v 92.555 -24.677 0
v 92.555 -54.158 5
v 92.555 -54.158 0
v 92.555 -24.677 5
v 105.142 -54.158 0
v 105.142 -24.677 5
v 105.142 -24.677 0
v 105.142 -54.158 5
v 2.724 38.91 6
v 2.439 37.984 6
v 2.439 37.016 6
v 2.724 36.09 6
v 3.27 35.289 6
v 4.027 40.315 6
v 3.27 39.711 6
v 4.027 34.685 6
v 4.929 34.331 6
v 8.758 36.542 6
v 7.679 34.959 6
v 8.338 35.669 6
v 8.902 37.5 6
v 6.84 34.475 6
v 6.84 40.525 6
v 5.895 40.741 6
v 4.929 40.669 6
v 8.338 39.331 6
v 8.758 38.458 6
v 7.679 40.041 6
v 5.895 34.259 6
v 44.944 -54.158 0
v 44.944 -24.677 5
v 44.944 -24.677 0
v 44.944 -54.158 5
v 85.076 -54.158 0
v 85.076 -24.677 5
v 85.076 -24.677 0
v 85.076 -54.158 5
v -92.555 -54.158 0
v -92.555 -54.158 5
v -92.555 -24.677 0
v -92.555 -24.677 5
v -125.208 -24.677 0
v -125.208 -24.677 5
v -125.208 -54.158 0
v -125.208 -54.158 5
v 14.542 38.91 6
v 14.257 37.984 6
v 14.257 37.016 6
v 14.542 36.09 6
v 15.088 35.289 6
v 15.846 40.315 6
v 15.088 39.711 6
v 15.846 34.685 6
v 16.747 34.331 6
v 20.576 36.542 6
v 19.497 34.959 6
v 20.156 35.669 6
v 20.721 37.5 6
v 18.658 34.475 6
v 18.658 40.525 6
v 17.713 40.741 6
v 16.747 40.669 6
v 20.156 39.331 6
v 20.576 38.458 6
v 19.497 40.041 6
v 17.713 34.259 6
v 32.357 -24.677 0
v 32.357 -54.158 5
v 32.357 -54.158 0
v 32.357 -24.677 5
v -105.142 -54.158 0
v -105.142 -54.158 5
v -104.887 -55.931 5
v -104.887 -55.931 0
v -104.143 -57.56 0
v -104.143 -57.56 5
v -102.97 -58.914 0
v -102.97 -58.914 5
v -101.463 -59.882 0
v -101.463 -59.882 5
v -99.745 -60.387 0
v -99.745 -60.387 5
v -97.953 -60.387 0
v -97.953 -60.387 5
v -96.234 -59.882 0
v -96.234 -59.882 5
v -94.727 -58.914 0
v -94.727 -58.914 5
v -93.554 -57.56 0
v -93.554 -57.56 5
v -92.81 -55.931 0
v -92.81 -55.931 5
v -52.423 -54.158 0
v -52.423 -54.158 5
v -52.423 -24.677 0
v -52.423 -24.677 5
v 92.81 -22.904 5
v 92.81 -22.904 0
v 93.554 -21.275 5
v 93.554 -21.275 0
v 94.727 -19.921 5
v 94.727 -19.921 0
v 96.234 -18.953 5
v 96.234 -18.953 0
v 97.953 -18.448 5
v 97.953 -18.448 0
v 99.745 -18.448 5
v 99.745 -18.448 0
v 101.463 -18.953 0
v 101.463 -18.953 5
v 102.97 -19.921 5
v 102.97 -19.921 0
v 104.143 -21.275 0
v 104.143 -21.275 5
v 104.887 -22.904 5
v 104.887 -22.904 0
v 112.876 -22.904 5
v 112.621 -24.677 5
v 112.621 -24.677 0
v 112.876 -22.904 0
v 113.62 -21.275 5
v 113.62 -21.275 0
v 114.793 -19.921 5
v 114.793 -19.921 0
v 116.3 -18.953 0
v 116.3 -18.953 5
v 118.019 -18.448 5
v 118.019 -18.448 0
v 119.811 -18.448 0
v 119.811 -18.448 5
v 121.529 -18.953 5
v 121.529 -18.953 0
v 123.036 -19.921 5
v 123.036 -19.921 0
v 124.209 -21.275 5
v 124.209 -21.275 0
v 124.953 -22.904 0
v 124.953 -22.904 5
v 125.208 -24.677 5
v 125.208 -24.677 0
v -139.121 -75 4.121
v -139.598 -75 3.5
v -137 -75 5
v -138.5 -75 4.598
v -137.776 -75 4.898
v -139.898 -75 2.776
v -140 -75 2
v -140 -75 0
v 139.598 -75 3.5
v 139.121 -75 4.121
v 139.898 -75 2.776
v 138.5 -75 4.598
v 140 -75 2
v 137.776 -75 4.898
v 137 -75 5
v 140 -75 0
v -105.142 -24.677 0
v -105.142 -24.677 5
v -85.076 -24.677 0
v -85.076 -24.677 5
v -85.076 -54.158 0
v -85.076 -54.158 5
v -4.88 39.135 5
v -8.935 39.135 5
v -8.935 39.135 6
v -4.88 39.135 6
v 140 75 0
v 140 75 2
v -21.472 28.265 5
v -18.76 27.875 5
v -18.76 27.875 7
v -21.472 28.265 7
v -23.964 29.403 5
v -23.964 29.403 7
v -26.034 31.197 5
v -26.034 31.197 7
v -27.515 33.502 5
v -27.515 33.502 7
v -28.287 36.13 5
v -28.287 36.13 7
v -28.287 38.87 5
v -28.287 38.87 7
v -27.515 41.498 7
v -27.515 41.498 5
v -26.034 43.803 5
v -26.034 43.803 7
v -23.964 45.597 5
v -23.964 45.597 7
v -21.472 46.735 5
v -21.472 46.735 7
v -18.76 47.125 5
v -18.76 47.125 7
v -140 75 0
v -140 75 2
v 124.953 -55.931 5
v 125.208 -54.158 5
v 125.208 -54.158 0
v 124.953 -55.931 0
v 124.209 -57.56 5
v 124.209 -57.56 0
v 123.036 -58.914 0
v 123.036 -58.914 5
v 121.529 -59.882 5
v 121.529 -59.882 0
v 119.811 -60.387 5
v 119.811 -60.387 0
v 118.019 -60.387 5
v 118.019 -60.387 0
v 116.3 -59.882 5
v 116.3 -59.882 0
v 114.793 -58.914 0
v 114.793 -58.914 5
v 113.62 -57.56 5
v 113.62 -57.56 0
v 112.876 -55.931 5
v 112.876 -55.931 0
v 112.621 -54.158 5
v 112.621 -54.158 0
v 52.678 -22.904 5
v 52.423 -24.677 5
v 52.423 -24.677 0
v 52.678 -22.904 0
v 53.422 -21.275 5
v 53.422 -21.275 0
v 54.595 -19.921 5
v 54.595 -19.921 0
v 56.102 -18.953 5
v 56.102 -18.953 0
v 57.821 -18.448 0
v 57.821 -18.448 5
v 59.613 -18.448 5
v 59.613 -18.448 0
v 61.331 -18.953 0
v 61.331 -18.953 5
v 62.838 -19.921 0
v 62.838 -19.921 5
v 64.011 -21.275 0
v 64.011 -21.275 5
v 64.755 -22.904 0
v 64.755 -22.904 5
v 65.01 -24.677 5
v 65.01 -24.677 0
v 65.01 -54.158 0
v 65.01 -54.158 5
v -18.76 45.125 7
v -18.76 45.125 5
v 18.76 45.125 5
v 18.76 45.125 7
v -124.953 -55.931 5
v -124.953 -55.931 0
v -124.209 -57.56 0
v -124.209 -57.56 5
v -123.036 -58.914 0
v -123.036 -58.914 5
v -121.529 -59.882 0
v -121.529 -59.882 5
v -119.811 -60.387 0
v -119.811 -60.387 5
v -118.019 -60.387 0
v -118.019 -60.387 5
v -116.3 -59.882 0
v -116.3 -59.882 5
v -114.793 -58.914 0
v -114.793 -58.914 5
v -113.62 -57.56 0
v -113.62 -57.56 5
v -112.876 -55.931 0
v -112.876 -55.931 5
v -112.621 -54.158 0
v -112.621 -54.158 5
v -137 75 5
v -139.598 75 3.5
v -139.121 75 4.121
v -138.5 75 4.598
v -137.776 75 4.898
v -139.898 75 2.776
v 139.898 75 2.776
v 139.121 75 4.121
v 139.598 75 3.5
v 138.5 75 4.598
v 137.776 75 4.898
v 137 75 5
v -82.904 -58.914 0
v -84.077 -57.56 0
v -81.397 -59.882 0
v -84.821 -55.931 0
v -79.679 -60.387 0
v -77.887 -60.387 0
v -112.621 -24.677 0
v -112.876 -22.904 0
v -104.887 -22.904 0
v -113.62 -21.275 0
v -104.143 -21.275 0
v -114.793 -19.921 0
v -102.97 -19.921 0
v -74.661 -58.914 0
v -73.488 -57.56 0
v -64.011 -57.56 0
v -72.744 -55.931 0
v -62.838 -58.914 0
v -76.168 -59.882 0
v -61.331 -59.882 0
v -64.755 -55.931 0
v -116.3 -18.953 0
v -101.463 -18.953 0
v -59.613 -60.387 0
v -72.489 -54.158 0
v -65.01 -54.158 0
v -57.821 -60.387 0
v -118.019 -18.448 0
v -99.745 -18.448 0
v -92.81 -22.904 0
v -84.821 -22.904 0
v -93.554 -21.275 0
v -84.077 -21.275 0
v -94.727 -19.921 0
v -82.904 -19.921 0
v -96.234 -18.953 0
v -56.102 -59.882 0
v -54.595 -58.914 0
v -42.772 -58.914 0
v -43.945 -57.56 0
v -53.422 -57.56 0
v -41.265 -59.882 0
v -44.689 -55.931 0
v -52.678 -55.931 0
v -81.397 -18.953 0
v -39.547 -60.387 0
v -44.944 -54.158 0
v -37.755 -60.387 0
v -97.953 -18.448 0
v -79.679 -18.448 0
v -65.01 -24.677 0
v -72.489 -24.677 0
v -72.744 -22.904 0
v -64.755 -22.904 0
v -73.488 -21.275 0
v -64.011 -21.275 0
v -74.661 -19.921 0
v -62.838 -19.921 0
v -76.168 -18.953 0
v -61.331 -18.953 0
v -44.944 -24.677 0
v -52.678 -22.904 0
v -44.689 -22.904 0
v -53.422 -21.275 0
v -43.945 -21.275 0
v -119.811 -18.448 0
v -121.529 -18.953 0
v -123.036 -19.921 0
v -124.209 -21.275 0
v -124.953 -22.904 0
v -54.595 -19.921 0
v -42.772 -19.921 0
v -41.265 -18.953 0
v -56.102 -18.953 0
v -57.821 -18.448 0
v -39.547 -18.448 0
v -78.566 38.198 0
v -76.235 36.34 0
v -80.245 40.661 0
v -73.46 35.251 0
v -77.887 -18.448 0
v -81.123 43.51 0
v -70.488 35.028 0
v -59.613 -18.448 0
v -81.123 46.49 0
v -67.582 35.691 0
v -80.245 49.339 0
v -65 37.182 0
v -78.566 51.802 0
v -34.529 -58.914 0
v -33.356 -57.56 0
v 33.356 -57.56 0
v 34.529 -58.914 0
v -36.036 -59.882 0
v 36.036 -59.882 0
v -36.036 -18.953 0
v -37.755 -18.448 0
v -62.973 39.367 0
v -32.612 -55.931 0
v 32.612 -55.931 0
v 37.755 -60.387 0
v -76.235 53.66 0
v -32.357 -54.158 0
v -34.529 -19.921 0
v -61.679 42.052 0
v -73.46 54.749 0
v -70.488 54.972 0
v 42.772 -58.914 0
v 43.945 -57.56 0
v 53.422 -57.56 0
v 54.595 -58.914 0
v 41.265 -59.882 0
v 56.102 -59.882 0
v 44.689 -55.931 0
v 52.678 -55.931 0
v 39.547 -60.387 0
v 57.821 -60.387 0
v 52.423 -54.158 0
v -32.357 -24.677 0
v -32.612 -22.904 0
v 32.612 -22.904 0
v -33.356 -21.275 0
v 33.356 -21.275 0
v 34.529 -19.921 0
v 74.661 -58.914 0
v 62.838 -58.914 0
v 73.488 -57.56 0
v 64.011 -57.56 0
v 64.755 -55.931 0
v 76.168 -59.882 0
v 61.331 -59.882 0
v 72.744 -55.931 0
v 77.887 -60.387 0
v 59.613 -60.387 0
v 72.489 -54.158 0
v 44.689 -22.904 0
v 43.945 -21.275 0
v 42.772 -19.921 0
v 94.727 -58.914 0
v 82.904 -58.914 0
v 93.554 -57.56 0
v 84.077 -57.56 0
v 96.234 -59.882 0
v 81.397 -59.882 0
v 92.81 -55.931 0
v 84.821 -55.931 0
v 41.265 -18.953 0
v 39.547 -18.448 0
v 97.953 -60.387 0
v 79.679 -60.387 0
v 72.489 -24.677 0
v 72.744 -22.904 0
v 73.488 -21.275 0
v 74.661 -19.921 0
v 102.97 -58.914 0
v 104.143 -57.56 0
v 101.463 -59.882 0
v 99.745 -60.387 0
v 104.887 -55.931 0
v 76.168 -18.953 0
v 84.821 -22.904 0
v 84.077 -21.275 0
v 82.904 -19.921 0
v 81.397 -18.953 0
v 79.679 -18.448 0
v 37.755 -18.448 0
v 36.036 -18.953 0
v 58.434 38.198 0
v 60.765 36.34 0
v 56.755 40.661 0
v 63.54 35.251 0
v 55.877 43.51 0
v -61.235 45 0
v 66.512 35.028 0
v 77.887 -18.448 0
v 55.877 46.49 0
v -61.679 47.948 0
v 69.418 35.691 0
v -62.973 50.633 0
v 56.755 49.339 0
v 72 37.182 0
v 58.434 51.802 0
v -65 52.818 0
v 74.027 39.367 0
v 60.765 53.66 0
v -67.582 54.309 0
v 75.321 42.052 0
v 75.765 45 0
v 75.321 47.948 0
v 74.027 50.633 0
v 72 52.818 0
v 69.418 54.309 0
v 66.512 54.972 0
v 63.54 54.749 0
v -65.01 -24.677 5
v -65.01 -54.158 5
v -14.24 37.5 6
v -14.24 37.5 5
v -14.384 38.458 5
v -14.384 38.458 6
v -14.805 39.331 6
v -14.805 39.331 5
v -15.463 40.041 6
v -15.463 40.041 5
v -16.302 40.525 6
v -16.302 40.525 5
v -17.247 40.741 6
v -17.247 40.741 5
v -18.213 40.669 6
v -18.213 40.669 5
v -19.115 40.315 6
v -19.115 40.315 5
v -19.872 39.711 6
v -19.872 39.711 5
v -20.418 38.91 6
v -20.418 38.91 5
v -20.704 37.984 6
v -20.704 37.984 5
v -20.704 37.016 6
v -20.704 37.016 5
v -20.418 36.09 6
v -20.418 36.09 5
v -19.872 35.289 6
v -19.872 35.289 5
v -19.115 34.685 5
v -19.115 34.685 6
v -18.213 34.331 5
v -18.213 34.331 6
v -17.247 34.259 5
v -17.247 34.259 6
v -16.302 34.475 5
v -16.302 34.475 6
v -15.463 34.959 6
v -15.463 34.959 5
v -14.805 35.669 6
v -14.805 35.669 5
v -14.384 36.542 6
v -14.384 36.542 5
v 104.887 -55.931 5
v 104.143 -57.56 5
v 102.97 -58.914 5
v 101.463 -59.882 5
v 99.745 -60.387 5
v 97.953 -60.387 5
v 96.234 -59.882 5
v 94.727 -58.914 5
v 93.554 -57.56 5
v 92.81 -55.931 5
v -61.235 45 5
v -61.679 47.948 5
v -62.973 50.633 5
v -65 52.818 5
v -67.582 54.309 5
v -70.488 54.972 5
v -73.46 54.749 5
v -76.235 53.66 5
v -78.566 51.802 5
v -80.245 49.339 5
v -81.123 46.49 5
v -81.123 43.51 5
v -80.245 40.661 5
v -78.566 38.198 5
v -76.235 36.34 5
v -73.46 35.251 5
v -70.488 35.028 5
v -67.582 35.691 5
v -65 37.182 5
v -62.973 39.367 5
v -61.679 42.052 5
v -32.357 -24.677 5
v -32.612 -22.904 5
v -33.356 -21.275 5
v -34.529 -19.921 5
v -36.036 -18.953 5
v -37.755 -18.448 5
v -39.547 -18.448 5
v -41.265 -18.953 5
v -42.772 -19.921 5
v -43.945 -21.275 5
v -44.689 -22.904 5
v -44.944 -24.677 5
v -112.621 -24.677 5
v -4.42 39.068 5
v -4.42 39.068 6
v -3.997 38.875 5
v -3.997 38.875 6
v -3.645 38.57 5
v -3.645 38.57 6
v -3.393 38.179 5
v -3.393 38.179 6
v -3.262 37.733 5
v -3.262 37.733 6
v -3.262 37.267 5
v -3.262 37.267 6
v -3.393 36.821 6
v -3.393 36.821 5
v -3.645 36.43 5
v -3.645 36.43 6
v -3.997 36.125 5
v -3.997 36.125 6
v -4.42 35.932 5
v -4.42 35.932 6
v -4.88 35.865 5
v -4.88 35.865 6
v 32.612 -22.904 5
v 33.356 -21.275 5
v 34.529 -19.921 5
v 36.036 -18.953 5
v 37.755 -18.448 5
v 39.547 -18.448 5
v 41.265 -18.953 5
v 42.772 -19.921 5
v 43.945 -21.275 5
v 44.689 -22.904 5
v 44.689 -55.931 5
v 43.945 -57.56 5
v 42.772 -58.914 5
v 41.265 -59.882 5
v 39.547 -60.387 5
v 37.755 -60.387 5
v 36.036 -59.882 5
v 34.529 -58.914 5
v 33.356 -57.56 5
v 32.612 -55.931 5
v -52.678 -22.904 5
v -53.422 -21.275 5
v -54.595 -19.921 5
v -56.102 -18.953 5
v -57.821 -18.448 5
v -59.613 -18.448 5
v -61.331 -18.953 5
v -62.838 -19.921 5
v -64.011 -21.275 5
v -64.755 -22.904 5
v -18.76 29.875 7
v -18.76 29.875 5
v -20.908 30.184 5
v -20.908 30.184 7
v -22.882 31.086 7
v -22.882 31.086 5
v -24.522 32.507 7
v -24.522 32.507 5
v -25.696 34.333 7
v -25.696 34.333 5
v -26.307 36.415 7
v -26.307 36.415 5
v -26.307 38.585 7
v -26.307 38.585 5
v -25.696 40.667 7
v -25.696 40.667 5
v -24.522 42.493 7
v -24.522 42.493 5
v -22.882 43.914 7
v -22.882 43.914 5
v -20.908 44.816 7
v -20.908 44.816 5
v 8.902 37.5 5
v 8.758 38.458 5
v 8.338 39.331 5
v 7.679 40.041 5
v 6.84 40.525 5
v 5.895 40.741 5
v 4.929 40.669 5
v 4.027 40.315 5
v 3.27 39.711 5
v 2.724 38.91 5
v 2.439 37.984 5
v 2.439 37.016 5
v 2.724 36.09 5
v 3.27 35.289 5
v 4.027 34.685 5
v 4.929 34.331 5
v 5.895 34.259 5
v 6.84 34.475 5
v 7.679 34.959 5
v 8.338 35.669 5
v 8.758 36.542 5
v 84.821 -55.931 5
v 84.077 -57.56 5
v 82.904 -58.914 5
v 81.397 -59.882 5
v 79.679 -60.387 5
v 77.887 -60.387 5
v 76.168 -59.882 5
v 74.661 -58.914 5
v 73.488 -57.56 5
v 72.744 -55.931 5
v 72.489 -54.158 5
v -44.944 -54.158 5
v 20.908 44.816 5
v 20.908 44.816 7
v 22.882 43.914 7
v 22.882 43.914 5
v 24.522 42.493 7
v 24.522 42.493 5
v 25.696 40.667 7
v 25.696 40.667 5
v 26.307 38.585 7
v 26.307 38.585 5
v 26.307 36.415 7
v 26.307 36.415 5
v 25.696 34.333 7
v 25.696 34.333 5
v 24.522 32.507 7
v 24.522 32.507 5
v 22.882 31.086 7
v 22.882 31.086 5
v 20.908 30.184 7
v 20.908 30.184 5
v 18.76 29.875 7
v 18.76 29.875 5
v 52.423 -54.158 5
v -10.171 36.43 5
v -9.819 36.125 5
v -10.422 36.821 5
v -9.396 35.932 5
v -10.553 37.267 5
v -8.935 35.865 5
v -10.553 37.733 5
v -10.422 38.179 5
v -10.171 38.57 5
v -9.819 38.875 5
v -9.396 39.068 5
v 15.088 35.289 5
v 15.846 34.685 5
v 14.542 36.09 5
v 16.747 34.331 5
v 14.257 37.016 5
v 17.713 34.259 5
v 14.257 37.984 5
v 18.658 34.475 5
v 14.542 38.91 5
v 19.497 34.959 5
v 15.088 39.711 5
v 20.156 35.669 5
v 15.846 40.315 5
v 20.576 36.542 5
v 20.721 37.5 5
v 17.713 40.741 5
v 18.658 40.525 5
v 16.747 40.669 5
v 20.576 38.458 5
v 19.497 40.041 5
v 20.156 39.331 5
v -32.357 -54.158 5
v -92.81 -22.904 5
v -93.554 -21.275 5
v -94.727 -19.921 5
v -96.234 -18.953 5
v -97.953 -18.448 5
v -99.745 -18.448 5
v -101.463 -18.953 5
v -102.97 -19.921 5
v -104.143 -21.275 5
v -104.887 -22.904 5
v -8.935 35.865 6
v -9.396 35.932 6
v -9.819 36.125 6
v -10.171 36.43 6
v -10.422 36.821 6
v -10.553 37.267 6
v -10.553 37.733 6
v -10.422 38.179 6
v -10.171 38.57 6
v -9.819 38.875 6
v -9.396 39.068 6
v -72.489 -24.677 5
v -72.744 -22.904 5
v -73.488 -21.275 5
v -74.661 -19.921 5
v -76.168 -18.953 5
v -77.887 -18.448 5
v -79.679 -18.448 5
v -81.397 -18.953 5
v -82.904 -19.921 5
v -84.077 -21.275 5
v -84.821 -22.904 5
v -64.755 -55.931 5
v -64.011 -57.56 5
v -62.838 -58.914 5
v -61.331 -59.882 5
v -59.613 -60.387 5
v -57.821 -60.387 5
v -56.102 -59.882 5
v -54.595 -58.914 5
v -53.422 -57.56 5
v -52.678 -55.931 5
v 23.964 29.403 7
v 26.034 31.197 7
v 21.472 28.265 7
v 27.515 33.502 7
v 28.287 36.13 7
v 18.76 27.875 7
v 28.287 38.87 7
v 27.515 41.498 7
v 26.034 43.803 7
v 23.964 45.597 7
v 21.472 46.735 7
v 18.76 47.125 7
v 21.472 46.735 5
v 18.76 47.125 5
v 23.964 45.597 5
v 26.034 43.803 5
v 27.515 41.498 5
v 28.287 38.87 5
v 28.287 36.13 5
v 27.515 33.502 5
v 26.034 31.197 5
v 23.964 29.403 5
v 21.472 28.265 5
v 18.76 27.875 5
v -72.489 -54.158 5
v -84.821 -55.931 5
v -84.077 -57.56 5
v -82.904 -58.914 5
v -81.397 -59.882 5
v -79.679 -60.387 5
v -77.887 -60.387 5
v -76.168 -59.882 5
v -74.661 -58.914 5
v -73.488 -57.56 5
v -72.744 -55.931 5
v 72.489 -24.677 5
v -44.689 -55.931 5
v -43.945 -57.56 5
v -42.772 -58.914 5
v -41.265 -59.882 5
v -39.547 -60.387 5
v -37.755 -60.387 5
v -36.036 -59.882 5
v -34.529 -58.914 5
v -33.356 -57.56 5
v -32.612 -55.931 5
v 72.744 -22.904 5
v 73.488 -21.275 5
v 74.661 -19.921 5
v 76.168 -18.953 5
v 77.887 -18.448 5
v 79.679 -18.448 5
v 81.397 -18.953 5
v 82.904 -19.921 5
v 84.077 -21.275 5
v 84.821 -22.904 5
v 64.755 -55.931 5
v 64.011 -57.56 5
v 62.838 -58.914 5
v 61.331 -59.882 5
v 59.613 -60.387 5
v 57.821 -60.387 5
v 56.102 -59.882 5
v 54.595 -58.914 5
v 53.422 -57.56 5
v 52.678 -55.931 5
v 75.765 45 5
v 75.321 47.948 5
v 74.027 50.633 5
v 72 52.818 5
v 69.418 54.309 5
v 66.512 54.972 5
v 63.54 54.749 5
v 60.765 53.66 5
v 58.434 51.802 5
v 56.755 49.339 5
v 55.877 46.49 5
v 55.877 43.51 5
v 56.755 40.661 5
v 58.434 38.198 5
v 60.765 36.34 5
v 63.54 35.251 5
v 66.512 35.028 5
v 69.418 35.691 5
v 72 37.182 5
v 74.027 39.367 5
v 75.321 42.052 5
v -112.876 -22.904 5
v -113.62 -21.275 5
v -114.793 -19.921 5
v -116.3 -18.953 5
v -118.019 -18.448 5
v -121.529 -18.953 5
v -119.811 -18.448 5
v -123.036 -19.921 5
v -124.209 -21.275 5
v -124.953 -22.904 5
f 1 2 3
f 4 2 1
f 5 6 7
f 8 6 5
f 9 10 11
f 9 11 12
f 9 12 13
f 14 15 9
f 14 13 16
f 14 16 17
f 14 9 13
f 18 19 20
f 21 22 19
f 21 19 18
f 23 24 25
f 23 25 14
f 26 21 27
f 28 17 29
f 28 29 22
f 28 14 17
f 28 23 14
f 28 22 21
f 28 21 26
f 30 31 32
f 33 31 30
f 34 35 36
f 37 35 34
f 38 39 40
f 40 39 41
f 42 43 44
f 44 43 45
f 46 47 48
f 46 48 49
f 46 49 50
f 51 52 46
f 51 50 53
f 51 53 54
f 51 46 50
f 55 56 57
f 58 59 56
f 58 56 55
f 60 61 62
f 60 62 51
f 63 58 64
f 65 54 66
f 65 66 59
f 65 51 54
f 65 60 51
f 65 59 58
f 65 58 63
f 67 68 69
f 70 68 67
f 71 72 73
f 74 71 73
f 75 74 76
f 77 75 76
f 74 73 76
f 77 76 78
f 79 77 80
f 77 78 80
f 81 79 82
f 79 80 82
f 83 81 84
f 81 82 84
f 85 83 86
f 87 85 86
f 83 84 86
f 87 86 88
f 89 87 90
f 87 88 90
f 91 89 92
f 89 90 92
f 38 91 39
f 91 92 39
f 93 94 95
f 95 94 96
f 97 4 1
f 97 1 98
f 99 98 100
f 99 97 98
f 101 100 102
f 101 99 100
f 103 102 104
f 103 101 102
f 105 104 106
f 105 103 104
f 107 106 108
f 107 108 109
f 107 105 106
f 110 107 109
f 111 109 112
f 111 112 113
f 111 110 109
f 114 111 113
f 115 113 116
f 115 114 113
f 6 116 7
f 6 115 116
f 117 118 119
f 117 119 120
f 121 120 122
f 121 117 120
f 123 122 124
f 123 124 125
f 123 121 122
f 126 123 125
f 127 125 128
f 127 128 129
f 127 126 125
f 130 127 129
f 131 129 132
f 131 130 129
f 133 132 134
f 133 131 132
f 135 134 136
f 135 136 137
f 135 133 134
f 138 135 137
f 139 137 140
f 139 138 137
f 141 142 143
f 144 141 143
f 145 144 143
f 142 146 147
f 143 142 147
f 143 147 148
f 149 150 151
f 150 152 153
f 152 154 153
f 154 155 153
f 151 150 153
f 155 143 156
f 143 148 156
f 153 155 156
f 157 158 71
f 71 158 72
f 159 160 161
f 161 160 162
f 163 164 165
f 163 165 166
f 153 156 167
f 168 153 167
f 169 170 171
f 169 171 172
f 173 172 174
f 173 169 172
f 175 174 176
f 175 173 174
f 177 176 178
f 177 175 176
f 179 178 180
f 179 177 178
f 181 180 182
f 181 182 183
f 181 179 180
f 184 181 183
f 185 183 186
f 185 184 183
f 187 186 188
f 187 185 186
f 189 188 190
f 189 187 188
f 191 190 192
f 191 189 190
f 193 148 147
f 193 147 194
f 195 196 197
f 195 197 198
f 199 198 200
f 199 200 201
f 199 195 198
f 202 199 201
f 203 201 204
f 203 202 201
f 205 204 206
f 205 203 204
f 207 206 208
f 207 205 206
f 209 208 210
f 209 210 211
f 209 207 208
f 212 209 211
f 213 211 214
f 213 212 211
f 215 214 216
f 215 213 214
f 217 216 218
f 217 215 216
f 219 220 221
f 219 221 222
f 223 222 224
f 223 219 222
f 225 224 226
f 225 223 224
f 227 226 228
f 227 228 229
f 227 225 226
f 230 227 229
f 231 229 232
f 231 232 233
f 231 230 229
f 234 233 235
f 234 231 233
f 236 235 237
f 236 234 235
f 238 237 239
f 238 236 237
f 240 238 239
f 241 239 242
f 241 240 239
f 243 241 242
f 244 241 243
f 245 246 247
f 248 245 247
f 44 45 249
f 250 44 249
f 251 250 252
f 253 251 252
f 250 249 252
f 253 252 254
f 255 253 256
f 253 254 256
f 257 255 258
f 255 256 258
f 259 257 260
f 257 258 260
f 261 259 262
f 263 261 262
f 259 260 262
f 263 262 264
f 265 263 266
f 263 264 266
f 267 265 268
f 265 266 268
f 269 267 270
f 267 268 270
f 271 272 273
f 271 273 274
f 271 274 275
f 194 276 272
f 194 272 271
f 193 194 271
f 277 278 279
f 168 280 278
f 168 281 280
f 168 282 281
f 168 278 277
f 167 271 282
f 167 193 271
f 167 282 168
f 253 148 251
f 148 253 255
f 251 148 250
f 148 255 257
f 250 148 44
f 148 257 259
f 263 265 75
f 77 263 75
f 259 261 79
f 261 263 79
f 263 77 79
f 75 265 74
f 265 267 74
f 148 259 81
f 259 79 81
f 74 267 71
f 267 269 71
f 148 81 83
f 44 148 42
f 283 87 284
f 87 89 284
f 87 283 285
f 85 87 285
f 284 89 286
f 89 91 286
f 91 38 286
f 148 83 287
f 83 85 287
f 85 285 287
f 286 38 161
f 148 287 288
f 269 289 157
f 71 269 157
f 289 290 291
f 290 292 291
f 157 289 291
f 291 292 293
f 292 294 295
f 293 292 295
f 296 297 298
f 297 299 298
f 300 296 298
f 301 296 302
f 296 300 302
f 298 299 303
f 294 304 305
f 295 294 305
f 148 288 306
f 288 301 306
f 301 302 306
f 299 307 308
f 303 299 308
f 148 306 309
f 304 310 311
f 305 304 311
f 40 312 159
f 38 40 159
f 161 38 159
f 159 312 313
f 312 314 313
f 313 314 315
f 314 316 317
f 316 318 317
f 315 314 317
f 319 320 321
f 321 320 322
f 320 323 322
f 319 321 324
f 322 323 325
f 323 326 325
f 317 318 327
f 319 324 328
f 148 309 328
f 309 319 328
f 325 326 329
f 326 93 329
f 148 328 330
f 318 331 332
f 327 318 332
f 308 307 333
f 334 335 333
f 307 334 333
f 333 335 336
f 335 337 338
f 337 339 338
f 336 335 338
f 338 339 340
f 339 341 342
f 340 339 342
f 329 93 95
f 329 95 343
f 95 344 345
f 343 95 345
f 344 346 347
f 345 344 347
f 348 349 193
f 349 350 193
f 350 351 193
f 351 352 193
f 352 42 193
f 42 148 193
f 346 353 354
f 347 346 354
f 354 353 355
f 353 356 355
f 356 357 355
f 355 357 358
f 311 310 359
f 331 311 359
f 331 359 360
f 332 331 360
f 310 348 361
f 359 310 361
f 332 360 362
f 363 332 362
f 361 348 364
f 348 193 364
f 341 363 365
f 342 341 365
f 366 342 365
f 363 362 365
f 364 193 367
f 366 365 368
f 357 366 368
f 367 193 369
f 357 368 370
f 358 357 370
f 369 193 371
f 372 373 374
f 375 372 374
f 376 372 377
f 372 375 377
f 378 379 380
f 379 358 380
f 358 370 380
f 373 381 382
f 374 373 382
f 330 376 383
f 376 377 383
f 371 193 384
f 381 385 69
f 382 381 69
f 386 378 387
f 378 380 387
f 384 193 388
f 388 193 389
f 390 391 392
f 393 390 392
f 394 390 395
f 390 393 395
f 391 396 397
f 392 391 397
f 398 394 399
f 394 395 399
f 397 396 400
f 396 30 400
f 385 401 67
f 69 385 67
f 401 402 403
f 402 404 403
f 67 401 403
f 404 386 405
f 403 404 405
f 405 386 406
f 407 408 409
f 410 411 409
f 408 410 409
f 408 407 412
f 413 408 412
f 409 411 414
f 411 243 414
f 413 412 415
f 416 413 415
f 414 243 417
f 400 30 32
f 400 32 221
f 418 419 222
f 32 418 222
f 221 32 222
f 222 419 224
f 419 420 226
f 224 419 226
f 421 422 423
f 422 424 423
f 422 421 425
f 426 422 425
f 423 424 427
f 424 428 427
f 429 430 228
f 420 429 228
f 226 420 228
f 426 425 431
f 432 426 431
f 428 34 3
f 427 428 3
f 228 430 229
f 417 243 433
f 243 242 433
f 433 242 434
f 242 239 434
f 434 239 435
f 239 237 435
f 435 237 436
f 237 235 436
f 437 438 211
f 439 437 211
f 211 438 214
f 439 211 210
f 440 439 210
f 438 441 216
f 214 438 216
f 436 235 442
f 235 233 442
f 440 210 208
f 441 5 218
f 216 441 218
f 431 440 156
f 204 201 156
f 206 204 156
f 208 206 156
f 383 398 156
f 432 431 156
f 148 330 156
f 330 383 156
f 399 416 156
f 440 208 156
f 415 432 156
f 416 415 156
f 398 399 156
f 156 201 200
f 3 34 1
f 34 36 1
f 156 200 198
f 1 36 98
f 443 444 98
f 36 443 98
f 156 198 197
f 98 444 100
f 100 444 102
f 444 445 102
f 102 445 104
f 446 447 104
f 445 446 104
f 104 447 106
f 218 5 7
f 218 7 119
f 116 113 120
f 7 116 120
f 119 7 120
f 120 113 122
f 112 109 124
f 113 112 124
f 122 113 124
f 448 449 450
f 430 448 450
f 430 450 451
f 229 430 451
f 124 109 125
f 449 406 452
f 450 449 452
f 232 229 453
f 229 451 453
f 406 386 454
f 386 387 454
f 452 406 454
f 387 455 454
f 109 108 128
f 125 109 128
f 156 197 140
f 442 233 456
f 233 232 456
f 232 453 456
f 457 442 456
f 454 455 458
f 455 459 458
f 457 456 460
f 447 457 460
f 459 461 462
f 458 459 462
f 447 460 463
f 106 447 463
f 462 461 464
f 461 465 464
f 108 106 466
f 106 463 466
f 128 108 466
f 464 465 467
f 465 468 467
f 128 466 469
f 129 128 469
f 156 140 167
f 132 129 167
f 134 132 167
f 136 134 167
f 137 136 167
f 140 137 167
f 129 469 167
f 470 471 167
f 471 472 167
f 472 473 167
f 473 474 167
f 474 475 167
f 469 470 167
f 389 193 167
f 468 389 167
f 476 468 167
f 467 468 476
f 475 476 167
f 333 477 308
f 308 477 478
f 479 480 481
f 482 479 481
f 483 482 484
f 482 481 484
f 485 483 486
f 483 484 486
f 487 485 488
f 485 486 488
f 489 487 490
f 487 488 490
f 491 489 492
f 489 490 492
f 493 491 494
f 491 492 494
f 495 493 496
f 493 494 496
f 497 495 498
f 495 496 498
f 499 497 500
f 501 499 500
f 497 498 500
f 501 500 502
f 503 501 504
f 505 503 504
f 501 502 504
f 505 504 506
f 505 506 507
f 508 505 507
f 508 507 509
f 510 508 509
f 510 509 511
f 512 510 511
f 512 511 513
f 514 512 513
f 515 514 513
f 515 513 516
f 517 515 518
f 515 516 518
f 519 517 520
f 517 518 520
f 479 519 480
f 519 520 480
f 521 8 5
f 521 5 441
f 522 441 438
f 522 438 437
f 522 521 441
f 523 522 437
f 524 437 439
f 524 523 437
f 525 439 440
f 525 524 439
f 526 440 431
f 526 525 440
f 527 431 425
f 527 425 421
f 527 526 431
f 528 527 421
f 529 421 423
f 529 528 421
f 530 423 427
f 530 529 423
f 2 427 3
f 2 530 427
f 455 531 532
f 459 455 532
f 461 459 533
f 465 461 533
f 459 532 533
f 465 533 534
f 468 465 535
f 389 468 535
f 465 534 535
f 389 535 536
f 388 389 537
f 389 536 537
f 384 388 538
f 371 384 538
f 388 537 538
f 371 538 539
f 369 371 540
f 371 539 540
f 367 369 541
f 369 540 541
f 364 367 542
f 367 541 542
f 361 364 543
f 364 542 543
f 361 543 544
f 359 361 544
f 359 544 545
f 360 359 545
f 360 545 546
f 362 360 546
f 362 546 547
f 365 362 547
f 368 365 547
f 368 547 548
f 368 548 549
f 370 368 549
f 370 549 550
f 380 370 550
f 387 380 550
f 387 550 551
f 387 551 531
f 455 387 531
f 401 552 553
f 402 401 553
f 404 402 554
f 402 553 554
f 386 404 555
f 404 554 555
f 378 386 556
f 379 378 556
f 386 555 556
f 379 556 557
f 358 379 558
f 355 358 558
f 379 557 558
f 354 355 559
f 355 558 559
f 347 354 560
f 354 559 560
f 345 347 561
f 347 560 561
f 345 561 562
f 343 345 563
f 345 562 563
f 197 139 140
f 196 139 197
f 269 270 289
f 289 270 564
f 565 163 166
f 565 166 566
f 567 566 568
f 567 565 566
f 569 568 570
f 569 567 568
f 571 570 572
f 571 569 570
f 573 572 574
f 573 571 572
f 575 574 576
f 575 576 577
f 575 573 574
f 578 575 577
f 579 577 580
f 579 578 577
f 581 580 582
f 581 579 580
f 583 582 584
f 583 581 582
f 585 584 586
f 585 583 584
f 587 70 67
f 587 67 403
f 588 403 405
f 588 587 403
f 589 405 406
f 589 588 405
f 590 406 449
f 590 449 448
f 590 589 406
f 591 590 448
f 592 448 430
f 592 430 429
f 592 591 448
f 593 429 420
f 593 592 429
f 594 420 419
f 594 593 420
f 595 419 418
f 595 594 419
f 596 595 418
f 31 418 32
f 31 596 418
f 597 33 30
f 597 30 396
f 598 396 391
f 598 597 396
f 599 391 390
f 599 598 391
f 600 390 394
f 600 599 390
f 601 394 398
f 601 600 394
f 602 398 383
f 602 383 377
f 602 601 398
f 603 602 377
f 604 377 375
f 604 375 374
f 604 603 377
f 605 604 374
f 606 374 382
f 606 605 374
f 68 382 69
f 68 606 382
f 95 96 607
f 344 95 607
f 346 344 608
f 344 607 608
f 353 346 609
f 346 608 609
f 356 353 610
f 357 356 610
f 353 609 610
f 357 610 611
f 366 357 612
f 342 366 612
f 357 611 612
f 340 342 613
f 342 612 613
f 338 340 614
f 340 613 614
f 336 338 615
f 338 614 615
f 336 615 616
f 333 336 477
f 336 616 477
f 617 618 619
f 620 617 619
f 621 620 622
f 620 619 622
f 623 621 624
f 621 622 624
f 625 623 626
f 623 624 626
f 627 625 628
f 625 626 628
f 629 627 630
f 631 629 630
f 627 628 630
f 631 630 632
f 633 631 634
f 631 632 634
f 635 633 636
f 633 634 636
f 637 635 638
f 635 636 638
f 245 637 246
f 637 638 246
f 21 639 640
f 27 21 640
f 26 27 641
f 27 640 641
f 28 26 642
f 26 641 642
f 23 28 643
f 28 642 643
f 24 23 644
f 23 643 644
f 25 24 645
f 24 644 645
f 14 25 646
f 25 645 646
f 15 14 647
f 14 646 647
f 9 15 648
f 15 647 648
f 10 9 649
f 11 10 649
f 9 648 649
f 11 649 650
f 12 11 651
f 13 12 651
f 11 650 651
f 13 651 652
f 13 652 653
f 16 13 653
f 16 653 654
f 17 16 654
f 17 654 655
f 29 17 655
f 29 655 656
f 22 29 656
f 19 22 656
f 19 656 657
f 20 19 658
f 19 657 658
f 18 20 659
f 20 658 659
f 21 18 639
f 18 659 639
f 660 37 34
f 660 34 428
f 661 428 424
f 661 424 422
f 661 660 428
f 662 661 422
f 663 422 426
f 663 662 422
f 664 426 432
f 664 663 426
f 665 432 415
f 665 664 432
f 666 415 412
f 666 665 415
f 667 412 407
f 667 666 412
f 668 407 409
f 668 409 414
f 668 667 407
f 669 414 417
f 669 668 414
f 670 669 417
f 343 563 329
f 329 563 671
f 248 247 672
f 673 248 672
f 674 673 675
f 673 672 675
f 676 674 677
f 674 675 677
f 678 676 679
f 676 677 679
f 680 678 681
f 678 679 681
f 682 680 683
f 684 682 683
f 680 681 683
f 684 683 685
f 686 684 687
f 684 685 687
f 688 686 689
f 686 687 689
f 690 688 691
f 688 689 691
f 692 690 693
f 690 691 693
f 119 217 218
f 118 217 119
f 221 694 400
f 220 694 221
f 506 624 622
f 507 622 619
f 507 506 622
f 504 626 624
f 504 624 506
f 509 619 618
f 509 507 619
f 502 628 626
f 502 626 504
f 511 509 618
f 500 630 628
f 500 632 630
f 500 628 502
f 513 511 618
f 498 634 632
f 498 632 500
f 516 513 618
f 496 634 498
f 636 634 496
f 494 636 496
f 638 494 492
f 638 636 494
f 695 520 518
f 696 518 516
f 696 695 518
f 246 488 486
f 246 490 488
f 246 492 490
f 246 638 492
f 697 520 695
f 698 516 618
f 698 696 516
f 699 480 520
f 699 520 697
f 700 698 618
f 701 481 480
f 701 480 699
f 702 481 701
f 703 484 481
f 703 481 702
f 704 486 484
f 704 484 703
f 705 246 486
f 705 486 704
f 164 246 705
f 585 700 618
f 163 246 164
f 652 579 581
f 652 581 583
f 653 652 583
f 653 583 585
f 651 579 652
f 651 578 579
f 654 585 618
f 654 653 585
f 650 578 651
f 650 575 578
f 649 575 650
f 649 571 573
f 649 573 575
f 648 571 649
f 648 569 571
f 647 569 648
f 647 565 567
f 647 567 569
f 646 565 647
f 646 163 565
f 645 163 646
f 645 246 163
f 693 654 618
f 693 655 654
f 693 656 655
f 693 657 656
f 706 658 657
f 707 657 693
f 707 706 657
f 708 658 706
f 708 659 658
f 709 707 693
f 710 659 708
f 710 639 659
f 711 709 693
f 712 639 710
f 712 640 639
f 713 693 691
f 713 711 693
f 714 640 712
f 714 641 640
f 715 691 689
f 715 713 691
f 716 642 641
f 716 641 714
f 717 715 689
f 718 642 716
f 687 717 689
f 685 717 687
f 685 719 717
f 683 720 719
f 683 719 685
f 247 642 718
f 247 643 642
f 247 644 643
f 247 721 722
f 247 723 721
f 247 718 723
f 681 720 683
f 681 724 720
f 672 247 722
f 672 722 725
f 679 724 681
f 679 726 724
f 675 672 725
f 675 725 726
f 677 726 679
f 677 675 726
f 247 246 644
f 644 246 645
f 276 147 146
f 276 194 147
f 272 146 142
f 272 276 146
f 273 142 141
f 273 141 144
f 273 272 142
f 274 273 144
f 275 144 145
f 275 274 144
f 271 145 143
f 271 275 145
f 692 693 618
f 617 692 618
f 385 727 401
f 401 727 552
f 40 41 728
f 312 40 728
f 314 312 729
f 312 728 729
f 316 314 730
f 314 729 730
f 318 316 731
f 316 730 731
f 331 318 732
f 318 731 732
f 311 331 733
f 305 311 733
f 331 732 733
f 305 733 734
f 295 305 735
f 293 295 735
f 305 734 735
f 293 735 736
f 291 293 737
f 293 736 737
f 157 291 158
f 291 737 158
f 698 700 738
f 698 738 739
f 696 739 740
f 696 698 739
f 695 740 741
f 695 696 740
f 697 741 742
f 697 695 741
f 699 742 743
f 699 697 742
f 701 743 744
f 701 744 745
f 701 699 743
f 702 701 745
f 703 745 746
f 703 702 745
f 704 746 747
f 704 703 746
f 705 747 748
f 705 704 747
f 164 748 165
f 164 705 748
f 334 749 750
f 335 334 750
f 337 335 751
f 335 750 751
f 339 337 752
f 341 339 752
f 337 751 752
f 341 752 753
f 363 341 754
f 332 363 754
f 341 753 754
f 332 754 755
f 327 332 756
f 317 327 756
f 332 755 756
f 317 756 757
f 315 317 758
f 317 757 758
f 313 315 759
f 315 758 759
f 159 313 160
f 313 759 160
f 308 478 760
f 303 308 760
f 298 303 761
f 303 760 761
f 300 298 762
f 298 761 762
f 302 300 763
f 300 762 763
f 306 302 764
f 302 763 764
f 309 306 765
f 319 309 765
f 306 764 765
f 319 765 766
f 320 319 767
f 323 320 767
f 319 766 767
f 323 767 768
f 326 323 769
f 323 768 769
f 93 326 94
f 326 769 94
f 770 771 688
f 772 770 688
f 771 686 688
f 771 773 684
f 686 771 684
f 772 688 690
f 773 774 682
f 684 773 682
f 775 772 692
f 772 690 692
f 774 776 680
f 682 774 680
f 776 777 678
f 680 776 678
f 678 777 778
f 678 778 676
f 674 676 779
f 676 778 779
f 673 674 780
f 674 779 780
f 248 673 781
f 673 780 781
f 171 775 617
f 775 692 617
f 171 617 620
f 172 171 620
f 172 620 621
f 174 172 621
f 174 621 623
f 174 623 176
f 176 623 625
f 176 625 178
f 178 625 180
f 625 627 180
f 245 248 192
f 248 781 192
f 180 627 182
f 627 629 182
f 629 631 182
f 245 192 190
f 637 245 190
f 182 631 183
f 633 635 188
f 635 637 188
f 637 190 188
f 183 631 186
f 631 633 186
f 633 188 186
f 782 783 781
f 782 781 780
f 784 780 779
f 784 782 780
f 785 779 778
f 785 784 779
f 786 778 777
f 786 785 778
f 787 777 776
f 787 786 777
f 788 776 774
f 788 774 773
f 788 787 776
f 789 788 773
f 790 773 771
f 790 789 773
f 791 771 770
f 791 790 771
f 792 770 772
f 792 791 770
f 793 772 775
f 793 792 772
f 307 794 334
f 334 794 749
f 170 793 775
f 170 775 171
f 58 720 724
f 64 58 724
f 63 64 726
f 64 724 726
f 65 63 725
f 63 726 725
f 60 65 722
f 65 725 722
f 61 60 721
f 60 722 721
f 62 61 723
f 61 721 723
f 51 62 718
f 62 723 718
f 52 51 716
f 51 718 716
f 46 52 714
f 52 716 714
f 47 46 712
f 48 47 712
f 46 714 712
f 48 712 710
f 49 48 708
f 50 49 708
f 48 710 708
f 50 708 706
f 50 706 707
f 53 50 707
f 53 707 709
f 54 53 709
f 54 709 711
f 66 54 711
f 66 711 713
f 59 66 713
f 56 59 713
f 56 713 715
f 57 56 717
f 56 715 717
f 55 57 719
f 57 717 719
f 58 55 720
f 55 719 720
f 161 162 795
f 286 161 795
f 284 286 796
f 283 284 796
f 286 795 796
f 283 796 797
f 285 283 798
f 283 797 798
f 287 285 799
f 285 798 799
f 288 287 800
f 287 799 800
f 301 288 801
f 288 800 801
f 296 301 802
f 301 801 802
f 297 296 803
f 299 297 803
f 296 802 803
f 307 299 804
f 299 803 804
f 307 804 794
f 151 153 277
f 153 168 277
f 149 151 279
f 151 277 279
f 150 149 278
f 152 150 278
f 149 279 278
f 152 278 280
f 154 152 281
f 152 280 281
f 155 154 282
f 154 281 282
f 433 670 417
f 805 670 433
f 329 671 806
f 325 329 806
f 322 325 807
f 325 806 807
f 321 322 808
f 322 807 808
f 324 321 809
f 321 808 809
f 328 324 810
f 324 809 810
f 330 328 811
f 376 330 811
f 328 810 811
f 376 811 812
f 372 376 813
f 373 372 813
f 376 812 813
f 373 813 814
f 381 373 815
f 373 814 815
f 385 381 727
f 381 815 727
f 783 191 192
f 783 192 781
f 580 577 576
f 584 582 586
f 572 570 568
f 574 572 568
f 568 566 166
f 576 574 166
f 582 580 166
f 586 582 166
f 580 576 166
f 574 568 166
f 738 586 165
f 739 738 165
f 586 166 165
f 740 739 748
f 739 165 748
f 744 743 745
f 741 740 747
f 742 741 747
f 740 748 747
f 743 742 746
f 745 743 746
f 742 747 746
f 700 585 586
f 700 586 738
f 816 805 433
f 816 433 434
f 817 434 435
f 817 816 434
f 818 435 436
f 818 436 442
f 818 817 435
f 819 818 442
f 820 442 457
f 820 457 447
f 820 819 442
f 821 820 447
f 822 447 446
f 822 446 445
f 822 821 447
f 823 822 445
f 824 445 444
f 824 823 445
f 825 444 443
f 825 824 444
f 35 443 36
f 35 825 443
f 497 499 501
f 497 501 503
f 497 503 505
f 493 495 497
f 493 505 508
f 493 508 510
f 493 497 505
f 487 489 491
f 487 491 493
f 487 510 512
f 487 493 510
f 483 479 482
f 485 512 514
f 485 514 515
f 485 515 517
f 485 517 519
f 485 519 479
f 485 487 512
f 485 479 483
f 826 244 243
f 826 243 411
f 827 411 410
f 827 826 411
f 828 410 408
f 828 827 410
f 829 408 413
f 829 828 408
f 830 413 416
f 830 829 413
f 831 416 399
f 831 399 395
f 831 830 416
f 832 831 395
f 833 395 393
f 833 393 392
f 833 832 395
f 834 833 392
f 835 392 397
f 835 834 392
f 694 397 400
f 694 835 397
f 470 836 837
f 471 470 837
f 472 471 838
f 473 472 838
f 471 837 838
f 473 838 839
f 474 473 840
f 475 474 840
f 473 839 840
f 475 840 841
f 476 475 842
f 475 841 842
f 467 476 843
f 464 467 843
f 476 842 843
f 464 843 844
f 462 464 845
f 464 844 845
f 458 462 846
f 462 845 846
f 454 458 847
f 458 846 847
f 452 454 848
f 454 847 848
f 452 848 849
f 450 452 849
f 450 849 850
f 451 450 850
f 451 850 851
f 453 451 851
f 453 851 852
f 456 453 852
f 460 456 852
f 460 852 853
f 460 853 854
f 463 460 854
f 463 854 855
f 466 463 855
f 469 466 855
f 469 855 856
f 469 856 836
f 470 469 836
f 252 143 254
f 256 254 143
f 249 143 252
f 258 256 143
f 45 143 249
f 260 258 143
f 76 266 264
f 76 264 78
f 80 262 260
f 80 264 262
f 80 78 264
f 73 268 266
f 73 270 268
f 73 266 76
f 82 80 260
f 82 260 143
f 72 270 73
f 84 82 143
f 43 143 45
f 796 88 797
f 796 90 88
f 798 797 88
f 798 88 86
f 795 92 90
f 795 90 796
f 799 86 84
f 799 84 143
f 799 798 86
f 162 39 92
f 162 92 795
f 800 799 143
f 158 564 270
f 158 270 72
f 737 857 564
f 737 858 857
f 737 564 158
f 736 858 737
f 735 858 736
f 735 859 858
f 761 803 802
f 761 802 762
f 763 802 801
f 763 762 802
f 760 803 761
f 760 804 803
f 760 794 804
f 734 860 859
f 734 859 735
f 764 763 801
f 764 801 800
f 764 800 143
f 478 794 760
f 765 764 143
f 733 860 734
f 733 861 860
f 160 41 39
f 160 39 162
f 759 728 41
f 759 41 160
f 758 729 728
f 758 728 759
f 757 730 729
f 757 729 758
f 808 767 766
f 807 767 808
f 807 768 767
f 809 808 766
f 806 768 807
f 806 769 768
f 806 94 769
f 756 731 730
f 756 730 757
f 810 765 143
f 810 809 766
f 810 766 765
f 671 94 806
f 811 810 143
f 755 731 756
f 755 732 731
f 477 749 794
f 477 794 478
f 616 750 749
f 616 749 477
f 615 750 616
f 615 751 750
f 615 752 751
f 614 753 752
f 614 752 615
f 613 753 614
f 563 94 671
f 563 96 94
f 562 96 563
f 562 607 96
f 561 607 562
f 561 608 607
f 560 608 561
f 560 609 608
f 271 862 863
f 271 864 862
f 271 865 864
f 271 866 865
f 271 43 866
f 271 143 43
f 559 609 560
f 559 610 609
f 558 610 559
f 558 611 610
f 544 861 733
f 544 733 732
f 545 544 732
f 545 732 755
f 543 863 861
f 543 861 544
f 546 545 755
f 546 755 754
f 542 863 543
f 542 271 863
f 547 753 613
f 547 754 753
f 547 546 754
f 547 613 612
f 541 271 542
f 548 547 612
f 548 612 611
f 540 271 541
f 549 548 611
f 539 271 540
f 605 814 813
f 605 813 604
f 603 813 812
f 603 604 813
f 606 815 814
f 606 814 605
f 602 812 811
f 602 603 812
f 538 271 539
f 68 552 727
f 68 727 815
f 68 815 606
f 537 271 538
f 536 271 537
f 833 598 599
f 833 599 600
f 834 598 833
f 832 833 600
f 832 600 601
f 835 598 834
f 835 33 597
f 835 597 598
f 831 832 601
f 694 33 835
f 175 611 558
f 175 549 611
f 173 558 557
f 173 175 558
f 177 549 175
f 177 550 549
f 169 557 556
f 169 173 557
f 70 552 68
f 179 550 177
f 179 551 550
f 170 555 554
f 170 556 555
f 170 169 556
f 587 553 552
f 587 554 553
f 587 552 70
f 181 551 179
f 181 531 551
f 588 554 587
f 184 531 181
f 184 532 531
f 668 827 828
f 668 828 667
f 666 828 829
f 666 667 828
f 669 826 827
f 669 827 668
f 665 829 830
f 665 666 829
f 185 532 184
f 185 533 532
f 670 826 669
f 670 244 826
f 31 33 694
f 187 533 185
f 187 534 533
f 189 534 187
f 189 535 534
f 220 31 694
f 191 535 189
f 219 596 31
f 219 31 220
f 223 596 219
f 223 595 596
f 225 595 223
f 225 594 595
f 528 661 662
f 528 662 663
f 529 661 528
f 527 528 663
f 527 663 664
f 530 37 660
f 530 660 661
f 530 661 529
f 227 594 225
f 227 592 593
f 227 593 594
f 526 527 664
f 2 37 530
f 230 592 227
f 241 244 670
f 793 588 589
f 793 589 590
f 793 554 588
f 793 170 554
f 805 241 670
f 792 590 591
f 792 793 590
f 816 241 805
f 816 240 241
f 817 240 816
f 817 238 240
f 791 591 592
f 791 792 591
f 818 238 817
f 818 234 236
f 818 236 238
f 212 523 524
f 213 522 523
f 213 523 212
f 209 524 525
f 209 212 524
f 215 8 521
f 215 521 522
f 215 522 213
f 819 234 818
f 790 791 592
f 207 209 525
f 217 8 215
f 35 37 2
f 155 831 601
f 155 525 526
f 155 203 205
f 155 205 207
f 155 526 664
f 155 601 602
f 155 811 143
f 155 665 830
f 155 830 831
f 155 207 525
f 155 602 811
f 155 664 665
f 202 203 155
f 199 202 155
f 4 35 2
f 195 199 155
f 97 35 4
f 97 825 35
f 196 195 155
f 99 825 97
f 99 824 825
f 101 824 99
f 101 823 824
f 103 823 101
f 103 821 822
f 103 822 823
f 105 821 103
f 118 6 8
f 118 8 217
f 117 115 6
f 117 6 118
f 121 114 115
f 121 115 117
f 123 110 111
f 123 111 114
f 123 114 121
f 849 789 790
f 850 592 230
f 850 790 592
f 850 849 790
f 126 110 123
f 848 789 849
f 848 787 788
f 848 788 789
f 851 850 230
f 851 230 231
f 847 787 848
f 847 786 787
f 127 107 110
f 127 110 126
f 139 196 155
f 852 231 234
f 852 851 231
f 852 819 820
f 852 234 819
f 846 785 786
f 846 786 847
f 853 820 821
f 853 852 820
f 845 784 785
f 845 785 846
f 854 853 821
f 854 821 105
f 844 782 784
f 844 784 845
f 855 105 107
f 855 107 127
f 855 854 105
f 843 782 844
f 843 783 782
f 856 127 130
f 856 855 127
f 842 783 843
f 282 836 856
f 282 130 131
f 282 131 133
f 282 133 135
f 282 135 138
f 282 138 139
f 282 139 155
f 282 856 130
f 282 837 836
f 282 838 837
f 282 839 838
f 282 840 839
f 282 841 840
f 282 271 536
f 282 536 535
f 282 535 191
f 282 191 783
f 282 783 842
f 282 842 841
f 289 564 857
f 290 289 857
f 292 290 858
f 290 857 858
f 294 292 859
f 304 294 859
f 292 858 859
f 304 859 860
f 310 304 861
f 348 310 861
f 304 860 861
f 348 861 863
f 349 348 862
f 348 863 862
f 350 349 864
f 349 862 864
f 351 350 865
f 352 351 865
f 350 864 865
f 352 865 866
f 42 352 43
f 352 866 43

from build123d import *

# Parameters (mm, degrees)
SKETCH1_W           = 280
SKETCH1_H           = 150
BOSS_EXTRUDE1_DEPTH = 5
FILLET1_R           = 3
BOSS_EXTRUDE2_DEPTH = 2
SKETCH4_R           = 3.25
BOSS_EXTRUDE3_DEPTH = 1
CUT_EXTRUDE1_DEPTH  = 5
CUT_EXTRUDE2_REACH  = 160.902
SKETCH6_R           = 10


with BuildPart() as part:
    # Sketch1 → Boss-Extrude1 (new body)
    with BuildSketch(Plane.XY):
        Rectangle(SKETCH1_W, SKETCH1_H)
    extrude(amount=BOSS_EXTRUDE1_DEPTH)

    # Fillet1
    fillet1_edges = [part.edges().sort_by_distance(p)[0] for p in [
        (140, 0, 5),
        (-140, 0, 5),
    ]]
    fillet(fillet1_edges, radius=FILLET1_R)

    # Sketch2 → Boss-Extrude2 (add)
    with BuildSketch(Plane.XY.offset(5)):
        with BuildLine():
            Line((-18.760224692, 47.124562697), (18.760224692, 47.124562697))
            ThreePointArc((18.760224692, 47.124562697), (28.384787389, 37.5), (18.760224692, 27.875437303))
            Line((18.760224692, 27.875437303), (-18.760224692, 27.875437303))
            ThreePointArc((-18.760224692, 27.875437303), (-28.384787389, 37.5), (-18.760224692, 47.124562697))
        make_face()
        with BuildLine():
            Line((-18.760224692, 45.124562697), (18.760224692, 45.124562697))
            ThreePointArc((18.760224692, 45.124562697), (26.384787389, 37.5), (18.760224692, 29.875437303))
            Line((18.760224692, 29.875437303), (-18.760224692, 29.875437303))
            ThreePointArc((-18.760224692, 29.875437303), (-26.384787389, 37.5), (-18.760224692, 45.124562697))
        make_face(mode=Mode.SUBTRACT)
    extrude(amount=BOSS_EXTRUDE2_DEPTH)

    # Sketch4 → Boss-Extrude3 (add)
    with BuildSketch(Plane.XY.offset(5)):
        with Locations((17.470523742, 37.5)):
            Circle(SKETCH4_R)
        with Locations((-17.4898287, 37.5)):
            Circle(SKETCH4_R)
        with Locations((5.652243355, 37.5)):
            Circle(SKETCH4_R)
        with BuildLine():
            Line((-8.935173859, 39.13468348), (-4.880366362, 39.13468348))
            ThreePointArc((-4.880366362, 39.13468348), (-3.245682882, 37.5), (-4.880366362, 35.86531652))
            Line((-4.880366362, 35.86531652), (-8.935173859, 35.86531652))
            ThreePointArc((-8.935173859, 35.86531652), (-10.569857339, 37.5), (-8.935173859, 39.13468348))
        make_face()
    extrude(amount=BOSS_EXTRUDE3_DEPTH)

    # Sketch5 → Cut-Extrude1 (cut)
    with BuildSketch(Plane.XY.offset(5)):
        with BuildLine():
            Line((125.208389031, -24.677314769), (125.208389031, -54.157596843))
            ThreePointArc((125.208389031, -54.157596843), (118.914845667, -60.451140207), (112.621302303, -54.157596843))
            Line((112.621302303, -54.157596843), (112.621302303, -24.677314769))
            ThreePointArc((112.621302303, -24.677314769), (118.914845667, -18.383771405), (125.208389031, -24.677314769))
        make_face()
        with BuildLine():
            Line((105.142389031, -24.677314769), (105.142389031, -54.157596843))
            ThreePointArc((105.142389031, -54.157596843), (98.848845667, -60.451140207), (92.555302303, -54.157596843))
            Line((92.555302303, -54.157596843), (92.555302303, -24.677314769))
            ThreePointArc((92.555302303, -24.677314769), (98.848845667, -18.383771405), (105.142389031, -24.677314769))
        make_face()
        with BuildLine():
            Line((85.076389031, -24.677314769), (85.076389031, -54.157596843))
            ThreePointArc((85.076389031, -54.157596843), (78.782845667, -60.451140207), (72.489302303, -54.157596843))
            Line((72.489302303, -54.157596843), (72.489302303, -24.677314769))
            ThreePointArc((72.489302303, -24.677314769), (78.782845667, -18.383771405), (85.076389031, -24.677314769))
        make_face()
        with BuildLine():
            Line((65.010389031, -24.677314769), (65.010389031, -54.157596843))
            ThreePointArc((65.010389031, -54.157596843), (58.716845667, -60.451140207), (52.423302303, -54.157596843))
            Line((52.423302303, -54.157596843), (52.423302303, -24.677314769))
            ThreePointArc((52.423302303, -24.677314769), (58.716845667, -18.383771405), (65.010389031, -24.677314769))
        make_face()
        with BuildLine():
            Line((44.944389031, -24.677314769), (44.944389031, -54.157596843))
            ThreePointArc((44.944389031, -54.157596843), (38.650845667, -60.451140207), (32.357302303, -54.157596843))
            Line((32.357302303, -54.157596843), (32.357302303, -24.677314769))
            ThreePointArc((32.357302303, -24.677314769), (38.650845667, -18.383771405), (44.944389031, -24.677314769))
        make_face()
    cut_extrude1 = extrude(amount=-CUT_EXTRUDE1_DEPTH, mode=Mode.SUBTRACT)

    # Mirror1: Cut-Extrude1 across plane
    add(cut_extrude1.mirror(Plane(origin=(0, 0, 0), x_dir=(0, 0, 1), z_dir=(1, 0, 0))), mode=Mode.SUBTRACT)

    # Sketch6 → Cut-Extrude2 (cut, up to next)
    with BuildSketch(Plane.XY.offset(5), mode=Mode.PRIVATE) as cut_extrude2_sk1:
        with Locations((65.764998976, 45)):
            Circle(SKETCH6_R)
    cut_extrude2_tool1 = extrude(cut_extrude2_sk1.sketch, amount=-CUT_EXTRUDE2_REACH, mode=Mode.PRIVATE) & part.part
    # Sketch6 → Cut-Extrude2 (cut, up to next)
    with BuildSketch(Plane.XY.offset(5), mode=Mode.PRIVATE) as cut_extrude2_sk2:
        with Locations((-71.235001024, 45)):
            Circle(SKETCH6_R)
    cut_extrude2_tool2 = extrude(cut_extrude2_sk2.sketch, amount=-CUT_EXTRUDE2_REACH, mode=Mode.PRIVATE) & part.part
    add(cut_extrude2_tool1.solids().sort_by_distance((65.764999, 45, 5))[0], mode=Mode.SUBTRACT)
    add(cut_extrude2_tool2.solids().sort_by_distance((-71.235001, 45, 5))[0], mode=Mode.SUBTRACT)


solid = part.part
